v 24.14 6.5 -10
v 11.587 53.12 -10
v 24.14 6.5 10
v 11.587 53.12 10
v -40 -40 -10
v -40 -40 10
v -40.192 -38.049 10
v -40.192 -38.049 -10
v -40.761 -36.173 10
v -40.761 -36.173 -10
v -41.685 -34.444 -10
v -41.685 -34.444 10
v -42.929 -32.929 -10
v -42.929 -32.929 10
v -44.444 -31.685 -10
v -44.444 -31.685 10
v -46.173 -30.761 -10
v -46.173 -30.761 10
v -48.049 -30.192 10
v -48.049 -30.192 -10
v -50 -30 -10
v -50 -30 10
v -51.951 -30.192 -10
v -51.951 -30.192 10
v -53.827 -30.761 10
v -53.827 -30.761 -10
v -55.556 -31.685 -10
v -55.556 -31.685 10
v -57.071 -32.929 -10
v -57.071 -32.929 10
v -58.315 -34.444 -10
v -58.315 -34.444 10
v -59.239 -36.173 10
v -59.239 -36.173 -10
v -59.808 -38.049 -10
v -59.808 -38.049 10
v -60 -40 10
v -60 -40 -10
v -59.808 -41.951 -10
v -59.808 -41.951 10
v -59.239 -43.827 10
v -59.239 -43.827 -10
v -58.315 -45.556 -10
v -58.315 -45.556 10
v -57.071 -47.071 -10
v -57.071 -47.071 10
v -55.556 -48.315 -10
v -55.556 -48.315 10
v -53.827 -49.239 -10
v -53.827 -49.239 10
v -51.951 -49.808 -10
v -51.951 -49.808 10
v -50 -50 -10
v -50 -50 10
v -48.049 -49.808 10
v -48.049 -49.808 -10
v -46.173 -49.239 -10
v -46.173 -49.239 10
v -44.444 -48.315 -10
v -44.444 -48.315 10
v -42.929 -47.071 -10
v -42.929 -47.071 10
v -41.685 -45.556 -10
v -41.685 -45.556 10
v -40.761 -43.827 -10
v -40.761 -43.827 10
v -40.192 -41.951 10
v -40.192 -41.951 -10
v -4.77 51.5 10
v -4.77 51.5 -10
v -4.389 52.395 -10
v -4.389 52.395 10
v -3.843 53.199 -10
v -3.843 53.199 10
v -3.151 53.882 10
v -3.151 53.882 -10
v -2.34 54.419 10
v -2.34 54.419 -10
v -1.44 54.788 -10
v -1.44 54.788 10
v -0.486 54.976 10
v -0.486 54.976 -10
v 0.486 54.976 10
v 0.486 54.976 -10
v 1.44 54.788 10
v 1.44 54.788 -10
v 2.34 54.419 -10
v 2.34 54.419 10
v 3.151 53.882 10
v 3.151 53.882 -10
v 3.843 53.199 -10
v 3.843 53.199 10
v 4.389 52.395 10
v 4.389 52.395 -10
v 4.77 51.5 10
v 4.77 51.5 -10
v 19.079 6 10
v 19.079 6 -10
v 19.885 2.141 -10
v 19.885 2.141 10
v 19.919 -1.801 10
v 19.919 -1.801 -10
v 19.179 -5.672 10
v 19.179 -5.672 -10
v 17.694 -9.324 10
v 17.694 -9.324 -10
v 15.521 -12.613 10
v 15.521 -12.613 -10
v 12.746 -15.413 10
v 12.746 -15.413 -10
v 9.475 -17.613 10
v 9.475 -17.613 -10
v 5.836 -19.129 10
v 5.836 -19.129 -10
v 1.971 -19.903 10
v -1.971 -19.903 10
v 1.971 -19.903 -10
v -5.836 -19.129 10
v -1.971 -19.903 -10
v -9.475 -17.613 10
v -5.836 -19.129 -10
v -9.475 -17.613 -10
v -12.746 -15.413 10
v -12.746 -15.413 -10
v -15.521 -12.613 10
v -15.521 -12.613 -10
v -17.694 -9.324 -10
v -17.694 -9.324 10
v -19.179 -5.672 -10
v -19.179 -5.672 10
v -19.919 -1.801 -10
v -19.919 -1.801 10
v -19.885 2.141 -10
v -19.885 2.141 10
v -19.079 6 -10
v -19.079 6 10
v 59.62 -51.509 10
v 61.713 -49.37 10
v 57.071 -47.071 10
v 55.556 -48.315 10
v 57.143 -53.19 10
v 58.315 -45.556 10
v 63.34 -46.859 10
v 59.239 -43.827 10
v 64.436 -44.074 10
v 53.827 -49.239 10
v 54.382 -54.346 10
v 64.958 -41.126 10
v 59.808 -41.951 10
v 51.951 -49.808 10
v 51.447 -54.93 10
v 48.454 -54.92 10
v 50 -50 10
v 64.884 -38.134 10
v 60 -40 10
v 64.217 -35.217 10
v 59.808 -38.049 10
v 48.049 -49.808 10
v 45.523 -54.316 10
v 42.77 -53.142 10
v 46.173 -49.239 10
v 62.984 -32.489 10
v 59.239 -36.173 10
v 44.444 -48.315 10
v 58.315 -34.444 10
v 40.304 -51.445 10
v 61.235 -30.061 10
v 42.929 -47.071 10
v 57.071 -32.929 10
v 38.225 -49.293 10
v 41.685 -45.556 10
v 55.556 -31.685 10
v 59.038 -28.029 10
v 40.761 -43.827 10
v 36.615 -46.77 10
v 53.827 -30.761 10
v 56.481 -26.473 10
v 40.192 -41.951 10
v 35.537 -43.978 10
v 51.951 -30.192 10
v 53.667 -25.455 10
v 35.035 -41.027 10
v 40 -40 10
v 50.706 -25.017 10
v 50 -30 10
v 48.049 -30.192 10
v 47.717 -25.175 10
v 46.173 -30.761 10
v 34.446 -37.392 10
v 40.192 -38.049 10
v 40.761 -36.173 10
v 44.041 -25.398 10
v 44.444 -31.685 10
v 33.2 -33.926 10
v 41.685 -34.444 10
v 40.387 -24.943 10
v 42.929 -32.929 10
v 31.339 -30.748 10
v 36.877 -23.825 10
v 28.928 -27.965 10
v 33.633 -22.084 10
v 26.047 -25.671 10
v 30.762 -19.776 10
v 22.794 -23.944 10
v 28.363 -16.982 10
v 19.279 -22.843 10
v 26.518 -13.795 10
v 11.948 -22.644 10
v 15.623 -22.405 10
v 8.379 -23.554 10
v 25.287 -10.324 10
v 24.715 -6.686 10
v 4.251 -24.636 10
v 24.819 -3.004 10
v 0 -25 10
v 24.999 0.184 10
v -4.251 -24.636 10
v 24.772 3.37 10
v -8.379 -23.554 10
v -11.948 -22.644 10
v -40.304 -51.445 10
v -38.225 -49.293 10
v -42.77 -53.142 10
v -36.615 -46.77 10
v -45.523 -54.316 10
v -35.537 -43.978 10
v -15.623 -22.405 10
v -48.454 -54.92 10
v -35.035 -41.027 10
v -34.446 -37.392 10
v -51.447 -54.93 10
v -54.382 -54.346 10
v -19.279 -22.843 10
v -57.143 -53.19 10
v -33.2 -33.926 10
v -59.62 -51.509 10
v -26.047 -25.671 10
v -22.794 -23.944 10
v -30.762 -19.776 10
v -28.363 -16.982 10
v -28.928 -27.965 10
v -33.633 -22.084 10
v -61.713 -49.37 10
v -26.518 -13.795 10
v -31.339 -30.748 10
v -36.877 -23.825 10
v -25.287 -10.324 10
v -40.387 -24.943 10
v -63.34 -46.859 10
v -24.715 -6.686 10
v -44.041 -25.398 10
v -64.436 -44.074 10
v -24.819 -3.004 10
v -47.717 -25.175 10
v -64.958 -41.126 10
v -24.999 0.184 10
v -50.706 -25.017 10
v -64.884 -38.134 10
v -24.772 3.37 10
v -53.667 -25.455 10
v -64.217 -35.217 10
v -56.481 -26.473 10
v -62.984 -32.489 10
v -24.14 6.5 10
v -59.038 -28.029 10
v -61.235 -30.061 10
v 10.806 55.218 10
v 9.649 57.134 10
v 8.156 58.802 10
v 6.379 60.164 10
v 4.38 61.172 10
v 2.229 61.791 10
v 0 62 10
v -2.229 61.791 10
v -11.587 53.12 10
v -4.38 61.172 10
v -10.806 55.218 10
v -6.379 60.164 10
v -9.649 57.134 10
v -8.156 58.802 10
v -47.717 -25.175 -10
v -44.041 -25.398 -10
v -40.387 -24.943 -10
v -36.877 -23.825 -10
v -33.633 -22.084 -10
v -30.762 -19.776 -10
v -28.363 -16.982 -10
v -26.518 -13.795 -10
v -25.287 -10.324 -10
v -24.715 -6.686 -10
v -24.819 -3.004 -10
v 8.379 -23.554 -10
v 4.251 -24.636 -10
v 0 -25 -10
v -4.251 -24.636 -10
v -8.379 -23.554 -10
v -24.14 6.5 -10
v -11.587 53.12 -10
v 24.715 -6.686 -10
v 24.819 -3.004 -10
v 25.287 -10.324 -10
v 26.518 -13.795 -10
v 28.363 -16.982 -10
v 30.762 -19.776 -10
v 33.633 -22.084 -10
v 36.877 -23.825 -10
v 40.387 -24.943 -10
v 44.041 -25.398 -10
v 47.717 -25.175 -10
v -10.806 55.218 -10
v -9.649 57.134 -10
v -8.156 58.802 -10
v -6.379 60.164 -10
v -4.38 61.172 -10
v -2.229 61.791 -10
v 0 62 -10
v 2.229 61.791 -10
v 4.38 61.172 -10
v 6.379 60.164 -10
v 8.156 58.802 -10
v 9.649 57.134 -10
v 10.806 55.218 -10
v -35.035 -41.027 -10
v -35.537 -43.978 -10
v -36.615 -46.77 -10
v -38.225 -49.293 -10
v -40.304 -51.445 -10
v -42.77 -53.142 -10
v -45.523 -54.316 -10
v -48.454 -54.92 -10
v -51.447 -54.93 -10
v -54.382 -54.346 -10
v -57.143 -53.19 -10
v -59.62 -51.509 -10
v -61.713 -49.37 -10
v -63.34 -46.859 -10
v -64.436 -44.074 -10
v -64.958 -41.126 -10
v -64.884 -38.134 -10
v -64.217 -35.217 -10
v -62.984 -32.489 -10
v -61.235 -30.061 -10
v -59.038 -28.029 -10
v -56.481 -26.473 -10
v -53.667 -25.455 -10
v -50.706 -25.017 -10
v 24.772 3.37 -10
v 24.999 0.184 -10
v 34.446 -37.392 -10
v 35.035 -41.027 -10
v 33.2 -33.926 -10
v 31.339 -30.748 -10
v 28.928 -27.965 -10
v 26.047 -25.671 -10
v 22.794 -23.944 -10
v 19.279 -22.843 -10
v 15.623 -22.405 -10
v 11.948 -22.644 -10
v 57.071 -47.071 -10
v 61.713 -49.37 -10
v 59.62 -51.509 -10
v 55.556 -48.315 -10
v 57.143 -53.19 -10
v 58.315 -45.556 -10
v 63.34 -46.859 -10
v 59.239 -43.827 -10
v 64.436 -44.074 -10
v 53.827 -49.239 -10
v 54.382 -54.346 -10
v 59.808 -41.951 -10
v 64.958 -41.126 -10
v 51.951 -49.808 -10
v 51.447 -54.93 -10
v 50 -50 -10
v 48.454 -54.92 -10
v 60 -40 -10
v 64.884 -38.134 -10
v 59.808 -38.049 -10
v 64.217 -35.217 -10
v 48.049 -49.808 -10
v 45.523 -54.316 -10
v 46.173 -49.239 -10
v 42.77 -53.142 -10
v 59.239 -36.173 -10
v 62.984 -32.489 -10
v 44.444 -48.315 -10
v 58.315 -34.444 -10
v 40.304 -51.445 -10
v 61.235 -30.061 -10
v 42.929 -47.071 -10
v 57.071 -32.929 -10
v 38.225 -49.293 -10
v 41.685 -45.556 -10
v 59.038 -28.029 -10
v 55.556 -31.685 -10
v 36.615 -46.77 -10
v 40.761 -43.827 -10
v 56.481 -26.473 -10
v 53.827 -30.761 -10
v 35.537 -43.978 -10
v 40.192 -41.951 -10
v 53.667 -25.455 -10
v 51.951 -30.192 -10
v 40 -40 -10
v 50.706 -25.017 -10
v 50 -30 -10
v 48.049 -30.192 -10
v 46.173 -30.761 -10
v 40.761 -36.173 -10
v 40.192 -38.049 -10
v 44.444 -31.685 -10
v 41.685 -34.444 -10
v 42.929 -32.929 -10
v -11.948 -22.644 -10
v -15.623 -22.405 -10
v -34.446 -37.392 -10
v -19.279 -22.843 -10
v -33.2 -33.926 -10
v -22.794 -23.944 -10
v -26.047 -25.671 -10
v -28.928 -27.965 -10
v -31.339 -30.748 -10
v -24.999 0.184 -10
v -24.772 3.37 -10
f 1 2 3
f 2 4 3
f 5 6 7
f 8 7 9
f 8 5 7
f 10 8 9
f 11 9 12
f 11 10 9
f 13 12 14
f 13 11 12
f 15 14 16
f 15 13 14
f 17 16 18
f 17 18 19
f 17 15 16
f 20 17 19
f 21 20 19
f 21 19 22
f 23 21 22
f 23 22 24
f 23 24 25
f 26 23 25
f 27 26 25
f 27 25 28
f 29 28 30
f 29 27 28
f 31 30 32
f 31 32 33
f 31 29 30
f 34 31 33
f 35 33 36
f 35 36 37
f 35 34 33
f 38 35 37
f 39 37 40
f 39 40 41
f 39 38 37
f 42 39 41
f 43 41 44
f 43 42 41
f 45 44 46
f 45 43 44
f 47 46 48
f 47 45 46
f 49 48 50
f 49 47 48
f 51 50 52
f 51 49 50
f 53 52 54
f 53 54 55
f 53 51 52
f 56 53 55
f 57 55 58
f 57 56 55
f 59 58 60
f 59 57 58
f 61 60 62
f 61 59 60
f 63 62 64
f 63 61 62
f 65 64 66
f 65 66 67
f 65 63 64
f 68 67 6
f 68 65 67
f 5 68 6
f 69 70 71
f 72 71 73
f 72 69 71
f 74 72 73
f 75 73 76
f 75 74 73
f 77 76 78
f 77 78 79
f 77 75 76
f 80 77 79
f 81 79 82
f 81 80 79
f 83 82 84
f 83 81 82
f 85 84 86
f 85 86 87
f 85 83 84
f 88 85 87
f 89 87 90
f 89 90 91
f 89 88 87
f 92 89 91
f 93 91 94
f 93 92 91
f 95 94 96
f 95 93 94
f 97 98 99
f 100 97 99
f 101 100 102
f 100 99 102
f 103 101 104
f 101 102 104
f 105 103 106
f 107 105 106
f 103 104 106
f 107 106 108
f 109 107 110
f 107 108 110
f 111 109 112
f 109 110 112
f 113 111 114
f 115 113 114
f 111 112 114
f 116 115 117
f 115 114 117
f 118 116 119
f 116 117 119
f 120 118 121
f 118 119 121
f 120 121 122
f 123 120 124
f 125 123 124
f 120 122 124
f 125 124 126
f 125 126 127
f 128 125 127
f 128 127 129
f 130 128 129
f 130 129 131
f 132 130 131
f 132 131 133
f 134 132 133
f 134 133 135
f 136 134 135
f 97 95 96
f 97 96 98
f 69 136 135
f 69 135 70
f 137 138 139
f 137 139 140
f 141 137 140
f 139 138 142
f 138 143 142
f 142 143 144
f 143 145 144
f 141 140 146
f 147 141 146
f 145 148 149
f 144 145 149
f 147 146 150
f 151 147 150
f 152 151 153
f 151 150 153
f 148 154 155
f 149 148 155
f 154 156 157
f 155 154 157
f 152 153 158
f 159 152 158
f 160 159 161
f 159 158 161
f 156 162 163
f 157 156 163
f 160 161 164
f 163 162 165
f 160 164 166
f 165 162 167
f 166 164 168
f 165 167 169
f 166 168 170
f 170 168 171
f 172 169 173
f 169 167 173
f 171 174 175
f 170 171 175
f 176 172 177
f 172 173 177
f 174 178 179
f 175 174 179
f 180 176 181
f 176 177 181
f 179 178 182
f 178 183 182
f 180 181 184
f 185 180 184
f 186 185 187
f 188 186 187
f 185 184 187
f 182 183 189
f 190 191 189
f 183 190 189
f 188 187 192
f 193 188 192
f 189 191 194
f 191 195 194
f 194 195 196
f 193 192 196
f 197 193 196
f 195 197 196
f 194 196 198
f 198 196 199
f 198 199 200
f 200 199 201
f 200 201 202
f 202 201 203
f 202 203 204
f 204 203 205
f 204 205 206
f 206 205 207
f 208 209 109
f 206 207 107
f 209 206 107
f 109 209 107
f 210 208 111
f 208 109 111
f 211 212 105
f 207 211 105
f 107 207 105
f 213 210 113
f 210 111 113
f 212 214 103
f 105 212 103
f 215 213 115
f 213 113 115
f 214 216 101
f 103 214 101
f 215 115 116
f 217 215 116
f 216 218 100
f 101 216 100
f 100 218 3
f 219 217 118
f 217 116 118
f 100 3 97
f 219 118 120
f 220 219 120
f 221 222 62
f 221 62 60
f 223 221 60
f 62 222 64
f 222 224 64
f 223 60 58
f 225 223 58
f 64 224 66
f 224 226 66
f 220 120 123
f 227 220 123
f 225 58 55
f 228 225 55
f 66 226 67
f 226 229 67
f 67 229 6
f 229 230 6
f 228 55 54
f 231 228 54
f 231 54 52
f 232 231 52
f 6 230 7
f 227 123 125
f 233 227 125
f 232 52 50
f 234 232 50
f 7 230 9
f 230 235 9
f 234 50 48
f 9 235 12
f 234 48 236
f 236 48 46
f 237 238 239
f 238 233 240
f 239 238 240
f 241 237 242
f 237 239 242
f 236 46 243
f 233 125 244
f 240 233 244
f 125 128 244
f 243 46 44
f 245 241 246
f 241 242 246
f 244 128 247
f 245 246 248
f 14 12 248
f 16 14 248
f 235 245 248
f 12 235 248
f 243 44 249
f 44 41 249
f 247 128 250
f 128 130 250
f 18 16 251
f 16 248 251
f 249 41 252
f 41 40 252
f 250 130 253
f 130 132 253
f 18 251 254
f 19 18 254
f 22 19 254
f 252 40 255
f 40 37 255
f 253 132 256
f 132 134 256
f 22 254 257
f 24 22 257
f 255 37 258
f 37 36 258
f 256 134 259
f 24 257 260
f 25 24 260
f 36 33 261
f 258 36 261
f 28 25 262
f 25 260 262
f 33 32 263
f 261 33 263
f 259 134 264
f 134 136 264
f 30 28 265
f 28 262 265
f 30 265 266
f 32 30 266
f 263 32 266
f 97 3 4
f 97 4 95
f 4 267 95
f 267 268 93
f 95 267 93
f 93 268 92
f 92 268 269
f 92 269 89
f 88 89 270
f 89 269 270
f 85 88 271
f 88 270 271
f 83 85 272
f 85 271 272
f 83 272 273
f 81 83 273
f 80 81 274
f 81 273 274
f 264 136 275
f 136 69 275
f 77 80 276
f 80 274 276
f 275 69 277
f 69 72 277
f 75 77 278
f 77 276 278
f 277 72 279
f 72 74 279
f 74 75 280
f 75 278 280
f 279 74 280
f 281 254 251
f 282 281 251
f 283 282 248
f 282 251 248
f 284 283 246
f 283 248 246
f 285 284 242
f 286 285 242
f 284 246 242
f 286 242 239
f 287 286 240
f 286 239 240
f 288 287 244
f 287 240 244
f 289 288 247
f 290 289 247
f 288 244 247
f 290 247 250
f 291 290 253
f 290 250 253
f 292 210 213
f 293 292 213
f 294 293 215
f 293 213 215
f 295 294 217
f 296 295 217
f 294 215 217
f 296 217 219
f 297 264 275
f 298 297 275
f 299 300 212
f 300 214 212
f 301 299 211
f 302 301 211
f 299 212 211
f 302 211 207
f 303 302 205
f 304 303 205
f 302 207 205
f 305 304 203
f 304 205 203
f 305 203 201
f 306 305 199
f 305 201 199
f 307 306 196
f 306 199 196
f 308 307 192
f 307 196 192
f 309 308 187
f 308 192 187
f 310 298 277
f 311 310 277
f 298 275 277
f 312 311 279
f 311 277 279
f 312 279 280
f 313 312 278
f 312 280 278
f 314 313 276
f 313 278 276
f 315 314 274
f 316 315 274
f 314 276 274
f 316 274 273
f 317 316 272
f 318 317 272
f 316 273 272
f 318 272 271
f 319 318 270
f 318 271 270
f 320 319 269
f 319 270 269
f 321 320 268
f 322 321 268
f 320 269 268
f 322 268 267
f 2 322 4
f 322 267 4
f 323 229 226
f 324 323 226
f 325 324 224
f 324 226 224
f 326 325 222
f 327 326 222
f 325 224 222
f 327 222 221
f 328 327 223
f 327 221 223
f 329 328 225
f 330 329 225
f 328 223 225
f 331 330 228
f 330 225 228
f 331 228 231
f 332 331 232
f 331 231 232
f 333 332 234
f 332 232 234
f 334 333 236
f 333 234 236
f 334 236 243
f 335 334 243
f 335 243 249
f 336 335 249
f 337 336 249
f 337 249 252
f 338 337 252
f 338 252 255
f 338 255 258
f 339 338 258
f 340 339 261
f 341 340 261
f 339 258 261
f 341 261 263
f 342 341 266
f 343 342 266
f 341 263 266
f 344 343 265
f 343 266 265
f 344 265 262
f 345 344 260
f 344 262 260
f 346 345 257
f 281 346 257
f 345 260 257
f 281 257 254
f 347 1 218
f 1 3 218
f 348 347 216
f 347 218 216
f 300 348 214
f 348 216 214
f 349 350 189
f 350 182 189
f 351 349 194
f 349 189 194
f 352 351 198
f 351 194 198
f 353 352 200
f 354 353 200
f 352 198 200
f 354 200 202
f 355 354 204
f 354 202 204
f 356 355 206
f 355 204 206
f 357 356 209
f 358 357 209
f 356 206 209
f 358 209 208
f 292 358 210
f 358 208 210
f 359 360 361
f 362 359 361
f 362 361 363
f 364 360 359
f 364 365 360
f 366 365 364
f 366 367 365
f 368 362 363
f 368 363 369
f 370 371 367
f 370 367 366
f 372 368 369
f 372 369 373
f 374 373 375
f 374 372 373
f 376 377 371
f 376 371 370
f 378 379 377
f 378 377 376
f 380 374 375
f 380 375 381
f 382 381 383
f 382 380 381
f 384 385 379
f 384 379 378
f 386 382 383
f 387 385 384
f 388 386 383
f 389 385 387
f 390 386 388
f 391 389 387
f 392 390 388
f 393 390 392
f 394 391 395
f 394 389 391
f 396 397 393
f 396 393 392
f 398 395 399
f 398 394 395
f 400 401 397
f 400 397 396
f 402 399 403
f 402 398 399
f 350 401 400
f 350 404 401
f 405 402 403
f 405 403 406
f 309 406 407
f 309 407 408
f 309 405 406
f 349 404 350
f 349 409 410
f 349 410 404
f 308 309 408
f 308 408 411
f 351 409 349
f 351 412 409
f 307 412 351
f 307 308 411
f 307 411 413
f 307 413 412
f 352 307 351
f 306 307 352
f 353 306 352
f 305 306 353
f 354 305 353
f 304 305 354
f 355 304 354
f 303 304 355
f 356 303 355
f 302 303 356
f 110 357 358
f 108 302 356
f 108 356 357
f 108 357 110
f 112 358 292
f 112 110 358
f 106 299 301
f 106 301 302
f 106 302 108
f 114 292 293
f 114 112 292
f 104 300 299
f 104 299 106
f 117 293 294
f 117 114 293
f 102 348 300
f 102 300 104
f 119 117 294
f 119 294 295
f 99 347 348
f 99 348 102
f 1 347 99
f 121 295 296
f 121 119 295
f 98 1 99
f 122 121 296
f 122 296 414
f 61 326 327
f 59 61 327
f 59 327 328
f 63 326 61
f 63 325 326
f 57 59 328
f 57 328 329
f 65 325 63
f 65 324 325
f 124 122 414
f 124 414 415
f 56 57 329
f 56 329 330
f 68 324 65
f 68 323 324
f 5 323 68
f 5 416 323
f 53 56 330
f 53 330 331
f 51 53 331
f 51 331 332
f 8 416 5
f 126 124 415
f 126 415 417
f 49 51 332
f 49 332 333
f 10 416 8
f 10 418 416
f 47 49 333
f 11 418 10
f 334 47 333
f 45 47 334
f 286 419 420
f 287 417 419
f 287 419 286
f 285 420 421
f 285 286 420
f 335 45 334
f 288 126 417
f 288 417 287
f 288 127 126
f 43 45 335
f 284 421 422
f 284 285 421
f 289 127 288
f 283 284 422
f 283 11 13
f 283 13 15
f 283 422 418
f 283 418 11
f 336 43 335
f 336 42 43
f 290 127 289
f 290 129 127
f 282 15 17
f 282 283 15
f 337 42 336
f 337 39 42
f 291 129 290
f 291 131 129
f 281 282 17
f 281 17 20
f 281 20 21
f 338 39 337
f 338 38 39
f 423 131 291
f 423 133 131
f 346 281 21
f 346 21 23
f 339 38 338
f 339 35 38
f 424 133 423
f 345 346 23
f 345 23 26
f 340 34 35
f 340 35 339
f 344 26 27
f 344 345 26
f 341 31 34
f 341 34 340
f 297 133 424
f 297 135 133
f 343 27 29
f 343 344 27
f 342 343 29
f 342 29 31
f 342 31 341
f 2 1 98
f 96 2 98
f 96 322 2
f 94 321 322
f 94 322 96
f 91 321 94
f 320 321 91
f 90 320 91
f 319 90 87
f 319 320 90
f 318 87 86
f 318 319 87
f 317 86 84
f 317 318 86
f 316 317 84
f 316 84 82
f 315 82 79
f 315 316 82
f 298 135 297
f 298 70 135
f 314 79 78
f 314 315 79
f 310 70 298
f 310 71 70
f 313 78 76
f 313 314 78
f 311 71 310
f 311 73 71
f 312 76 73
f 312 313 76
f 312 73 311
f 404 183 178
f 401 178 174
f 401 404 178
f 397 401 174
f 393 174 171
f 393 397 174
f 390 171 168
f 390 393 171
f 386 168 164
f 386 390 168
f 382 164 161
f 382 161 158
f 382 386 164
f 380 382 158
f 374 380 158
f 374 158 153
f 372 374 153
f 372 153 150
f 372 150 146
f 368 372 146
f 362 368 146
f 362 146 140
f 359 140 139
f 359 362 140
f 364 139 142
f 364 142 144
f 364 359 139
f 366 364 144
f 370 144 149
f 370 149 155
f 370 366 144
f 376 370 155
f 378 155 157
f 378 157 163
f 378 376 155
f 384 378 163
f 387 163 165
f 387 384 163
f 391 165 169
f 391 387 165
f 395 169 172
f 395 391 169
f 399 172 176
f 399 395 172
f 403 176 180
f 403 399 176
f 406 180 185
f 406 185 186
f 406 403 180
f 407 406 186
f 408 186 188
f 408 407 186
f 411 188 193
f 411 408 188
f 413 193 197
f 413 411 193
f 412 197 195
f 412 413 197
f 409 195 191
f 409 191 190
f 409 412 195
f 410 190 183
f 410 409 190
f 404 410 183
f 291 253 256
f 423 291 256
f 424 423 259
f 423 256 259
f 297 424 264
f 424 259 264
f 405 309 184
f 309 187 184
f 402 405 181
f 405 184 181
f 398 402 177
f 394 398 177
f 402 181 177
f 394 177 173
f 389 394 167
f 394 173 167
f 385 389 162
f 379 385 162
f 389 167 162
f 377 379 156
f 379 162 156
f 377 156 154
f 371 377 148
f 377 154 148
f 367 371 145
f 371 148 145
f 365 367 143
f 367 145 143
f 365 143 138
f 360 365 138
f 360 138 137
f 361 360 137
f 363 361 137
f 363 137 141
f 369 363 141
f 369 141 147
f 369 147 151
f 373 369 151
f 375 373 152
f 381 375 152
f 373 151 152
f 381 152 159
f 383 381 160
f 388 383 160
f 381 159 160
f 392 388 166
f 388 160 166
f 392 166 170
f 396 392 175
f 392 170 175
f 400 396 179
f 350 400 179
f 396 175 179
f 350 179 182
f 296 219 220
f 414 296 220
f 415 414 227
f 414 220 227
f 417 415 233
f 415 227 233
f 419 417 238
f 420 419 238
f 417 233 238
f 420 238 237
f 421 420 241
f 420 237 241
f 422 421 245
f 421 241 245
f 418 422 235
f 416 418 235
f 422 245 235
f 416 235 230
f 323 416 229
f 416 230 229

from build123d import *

# Parameters (mm, degrees)
SKETCH1_R           = 10
BOSS_EXTRUDE1_DEPTH = 10


with BuildPart() as part:
    # Sketch1 → Boss-Extrude1 (new, symmetric)
    with BuildSketch(Plane.XY):
        with BuildLine():
            Line((-24.140215409, 6.5), (-11.587303396, 53.12))
            ThreePointArc((-11.587303396, 53.12), (0, 62), (11.587303396, 53.12))
            Line((11.587303396, 53.12), (24.140215409, 6.5))
            ThreePointArc((24.140215409, 6.5), (24.936514863, 1.780512988), (24.81883517, -3.004233816))
            ThreePointArc((24.81883517, -3.004233816), (30.762049538, -19.776348187), (47.717387131, -25.174694658))
            ThreePointArc((47.717387131, -25.174694658), (61.713032142, -49.370425713), (35.03522611, -41.027395935))
            ThreePointArc((35.03522611, -41.027395935), (26.046643252, -25.670606045), (8.378996809, -23.554031767))
            ThreePointArc((8.378996809, -23.554031767), (0, -25), (-8.378996809, -23.554031767))
            ThreePointArc((-8.378996809, -23.554031767), (-26.046643252, -25.670606045), (-35.03522611, -41.027395935))
            ThreePointArc((-35.03522611, -41.027395935), (-61.713032142, -49.370425713), (-47.717387131, -25.174694658))
            ThreePointArc((-47.717387131, -25.174694658), (-30.762049538, -19.776348187), (-24.81883517, -3.004233816))
            ThreePointArc((-24.81883517, -3.004233816), (-24.936514863, 1.780512988), (-24.140215409, 6.5))
        make_face()
        with Locations((-50, -40)):
            Circle(SKETCH1_R, mode=Mode.SUBTRACT)
        with Locations(Location((50, -40, 0), (0, 0, 180))):
            Circle(SKETCH1_R, mode=Mode.SUBTRACT)
        with BuildLine():
            Line((-19.078784028, 6), (-4.769696007, 51.5))
            ThreePointArc((-4.769696007, 51.5), (0, 55), (4.769696007, 51.5))
            Line((4.769696007, 51.5), (19.078784028, 6))
            ThreePointArc((19.078784028, 6), (0, -20), (-19.078784028, 6))
        make_face(mode=Mode.SUBTRACT)
    extrude(amount=BOSS_EXTRUDE1_DEPTH, both=True)


solid = part.part
